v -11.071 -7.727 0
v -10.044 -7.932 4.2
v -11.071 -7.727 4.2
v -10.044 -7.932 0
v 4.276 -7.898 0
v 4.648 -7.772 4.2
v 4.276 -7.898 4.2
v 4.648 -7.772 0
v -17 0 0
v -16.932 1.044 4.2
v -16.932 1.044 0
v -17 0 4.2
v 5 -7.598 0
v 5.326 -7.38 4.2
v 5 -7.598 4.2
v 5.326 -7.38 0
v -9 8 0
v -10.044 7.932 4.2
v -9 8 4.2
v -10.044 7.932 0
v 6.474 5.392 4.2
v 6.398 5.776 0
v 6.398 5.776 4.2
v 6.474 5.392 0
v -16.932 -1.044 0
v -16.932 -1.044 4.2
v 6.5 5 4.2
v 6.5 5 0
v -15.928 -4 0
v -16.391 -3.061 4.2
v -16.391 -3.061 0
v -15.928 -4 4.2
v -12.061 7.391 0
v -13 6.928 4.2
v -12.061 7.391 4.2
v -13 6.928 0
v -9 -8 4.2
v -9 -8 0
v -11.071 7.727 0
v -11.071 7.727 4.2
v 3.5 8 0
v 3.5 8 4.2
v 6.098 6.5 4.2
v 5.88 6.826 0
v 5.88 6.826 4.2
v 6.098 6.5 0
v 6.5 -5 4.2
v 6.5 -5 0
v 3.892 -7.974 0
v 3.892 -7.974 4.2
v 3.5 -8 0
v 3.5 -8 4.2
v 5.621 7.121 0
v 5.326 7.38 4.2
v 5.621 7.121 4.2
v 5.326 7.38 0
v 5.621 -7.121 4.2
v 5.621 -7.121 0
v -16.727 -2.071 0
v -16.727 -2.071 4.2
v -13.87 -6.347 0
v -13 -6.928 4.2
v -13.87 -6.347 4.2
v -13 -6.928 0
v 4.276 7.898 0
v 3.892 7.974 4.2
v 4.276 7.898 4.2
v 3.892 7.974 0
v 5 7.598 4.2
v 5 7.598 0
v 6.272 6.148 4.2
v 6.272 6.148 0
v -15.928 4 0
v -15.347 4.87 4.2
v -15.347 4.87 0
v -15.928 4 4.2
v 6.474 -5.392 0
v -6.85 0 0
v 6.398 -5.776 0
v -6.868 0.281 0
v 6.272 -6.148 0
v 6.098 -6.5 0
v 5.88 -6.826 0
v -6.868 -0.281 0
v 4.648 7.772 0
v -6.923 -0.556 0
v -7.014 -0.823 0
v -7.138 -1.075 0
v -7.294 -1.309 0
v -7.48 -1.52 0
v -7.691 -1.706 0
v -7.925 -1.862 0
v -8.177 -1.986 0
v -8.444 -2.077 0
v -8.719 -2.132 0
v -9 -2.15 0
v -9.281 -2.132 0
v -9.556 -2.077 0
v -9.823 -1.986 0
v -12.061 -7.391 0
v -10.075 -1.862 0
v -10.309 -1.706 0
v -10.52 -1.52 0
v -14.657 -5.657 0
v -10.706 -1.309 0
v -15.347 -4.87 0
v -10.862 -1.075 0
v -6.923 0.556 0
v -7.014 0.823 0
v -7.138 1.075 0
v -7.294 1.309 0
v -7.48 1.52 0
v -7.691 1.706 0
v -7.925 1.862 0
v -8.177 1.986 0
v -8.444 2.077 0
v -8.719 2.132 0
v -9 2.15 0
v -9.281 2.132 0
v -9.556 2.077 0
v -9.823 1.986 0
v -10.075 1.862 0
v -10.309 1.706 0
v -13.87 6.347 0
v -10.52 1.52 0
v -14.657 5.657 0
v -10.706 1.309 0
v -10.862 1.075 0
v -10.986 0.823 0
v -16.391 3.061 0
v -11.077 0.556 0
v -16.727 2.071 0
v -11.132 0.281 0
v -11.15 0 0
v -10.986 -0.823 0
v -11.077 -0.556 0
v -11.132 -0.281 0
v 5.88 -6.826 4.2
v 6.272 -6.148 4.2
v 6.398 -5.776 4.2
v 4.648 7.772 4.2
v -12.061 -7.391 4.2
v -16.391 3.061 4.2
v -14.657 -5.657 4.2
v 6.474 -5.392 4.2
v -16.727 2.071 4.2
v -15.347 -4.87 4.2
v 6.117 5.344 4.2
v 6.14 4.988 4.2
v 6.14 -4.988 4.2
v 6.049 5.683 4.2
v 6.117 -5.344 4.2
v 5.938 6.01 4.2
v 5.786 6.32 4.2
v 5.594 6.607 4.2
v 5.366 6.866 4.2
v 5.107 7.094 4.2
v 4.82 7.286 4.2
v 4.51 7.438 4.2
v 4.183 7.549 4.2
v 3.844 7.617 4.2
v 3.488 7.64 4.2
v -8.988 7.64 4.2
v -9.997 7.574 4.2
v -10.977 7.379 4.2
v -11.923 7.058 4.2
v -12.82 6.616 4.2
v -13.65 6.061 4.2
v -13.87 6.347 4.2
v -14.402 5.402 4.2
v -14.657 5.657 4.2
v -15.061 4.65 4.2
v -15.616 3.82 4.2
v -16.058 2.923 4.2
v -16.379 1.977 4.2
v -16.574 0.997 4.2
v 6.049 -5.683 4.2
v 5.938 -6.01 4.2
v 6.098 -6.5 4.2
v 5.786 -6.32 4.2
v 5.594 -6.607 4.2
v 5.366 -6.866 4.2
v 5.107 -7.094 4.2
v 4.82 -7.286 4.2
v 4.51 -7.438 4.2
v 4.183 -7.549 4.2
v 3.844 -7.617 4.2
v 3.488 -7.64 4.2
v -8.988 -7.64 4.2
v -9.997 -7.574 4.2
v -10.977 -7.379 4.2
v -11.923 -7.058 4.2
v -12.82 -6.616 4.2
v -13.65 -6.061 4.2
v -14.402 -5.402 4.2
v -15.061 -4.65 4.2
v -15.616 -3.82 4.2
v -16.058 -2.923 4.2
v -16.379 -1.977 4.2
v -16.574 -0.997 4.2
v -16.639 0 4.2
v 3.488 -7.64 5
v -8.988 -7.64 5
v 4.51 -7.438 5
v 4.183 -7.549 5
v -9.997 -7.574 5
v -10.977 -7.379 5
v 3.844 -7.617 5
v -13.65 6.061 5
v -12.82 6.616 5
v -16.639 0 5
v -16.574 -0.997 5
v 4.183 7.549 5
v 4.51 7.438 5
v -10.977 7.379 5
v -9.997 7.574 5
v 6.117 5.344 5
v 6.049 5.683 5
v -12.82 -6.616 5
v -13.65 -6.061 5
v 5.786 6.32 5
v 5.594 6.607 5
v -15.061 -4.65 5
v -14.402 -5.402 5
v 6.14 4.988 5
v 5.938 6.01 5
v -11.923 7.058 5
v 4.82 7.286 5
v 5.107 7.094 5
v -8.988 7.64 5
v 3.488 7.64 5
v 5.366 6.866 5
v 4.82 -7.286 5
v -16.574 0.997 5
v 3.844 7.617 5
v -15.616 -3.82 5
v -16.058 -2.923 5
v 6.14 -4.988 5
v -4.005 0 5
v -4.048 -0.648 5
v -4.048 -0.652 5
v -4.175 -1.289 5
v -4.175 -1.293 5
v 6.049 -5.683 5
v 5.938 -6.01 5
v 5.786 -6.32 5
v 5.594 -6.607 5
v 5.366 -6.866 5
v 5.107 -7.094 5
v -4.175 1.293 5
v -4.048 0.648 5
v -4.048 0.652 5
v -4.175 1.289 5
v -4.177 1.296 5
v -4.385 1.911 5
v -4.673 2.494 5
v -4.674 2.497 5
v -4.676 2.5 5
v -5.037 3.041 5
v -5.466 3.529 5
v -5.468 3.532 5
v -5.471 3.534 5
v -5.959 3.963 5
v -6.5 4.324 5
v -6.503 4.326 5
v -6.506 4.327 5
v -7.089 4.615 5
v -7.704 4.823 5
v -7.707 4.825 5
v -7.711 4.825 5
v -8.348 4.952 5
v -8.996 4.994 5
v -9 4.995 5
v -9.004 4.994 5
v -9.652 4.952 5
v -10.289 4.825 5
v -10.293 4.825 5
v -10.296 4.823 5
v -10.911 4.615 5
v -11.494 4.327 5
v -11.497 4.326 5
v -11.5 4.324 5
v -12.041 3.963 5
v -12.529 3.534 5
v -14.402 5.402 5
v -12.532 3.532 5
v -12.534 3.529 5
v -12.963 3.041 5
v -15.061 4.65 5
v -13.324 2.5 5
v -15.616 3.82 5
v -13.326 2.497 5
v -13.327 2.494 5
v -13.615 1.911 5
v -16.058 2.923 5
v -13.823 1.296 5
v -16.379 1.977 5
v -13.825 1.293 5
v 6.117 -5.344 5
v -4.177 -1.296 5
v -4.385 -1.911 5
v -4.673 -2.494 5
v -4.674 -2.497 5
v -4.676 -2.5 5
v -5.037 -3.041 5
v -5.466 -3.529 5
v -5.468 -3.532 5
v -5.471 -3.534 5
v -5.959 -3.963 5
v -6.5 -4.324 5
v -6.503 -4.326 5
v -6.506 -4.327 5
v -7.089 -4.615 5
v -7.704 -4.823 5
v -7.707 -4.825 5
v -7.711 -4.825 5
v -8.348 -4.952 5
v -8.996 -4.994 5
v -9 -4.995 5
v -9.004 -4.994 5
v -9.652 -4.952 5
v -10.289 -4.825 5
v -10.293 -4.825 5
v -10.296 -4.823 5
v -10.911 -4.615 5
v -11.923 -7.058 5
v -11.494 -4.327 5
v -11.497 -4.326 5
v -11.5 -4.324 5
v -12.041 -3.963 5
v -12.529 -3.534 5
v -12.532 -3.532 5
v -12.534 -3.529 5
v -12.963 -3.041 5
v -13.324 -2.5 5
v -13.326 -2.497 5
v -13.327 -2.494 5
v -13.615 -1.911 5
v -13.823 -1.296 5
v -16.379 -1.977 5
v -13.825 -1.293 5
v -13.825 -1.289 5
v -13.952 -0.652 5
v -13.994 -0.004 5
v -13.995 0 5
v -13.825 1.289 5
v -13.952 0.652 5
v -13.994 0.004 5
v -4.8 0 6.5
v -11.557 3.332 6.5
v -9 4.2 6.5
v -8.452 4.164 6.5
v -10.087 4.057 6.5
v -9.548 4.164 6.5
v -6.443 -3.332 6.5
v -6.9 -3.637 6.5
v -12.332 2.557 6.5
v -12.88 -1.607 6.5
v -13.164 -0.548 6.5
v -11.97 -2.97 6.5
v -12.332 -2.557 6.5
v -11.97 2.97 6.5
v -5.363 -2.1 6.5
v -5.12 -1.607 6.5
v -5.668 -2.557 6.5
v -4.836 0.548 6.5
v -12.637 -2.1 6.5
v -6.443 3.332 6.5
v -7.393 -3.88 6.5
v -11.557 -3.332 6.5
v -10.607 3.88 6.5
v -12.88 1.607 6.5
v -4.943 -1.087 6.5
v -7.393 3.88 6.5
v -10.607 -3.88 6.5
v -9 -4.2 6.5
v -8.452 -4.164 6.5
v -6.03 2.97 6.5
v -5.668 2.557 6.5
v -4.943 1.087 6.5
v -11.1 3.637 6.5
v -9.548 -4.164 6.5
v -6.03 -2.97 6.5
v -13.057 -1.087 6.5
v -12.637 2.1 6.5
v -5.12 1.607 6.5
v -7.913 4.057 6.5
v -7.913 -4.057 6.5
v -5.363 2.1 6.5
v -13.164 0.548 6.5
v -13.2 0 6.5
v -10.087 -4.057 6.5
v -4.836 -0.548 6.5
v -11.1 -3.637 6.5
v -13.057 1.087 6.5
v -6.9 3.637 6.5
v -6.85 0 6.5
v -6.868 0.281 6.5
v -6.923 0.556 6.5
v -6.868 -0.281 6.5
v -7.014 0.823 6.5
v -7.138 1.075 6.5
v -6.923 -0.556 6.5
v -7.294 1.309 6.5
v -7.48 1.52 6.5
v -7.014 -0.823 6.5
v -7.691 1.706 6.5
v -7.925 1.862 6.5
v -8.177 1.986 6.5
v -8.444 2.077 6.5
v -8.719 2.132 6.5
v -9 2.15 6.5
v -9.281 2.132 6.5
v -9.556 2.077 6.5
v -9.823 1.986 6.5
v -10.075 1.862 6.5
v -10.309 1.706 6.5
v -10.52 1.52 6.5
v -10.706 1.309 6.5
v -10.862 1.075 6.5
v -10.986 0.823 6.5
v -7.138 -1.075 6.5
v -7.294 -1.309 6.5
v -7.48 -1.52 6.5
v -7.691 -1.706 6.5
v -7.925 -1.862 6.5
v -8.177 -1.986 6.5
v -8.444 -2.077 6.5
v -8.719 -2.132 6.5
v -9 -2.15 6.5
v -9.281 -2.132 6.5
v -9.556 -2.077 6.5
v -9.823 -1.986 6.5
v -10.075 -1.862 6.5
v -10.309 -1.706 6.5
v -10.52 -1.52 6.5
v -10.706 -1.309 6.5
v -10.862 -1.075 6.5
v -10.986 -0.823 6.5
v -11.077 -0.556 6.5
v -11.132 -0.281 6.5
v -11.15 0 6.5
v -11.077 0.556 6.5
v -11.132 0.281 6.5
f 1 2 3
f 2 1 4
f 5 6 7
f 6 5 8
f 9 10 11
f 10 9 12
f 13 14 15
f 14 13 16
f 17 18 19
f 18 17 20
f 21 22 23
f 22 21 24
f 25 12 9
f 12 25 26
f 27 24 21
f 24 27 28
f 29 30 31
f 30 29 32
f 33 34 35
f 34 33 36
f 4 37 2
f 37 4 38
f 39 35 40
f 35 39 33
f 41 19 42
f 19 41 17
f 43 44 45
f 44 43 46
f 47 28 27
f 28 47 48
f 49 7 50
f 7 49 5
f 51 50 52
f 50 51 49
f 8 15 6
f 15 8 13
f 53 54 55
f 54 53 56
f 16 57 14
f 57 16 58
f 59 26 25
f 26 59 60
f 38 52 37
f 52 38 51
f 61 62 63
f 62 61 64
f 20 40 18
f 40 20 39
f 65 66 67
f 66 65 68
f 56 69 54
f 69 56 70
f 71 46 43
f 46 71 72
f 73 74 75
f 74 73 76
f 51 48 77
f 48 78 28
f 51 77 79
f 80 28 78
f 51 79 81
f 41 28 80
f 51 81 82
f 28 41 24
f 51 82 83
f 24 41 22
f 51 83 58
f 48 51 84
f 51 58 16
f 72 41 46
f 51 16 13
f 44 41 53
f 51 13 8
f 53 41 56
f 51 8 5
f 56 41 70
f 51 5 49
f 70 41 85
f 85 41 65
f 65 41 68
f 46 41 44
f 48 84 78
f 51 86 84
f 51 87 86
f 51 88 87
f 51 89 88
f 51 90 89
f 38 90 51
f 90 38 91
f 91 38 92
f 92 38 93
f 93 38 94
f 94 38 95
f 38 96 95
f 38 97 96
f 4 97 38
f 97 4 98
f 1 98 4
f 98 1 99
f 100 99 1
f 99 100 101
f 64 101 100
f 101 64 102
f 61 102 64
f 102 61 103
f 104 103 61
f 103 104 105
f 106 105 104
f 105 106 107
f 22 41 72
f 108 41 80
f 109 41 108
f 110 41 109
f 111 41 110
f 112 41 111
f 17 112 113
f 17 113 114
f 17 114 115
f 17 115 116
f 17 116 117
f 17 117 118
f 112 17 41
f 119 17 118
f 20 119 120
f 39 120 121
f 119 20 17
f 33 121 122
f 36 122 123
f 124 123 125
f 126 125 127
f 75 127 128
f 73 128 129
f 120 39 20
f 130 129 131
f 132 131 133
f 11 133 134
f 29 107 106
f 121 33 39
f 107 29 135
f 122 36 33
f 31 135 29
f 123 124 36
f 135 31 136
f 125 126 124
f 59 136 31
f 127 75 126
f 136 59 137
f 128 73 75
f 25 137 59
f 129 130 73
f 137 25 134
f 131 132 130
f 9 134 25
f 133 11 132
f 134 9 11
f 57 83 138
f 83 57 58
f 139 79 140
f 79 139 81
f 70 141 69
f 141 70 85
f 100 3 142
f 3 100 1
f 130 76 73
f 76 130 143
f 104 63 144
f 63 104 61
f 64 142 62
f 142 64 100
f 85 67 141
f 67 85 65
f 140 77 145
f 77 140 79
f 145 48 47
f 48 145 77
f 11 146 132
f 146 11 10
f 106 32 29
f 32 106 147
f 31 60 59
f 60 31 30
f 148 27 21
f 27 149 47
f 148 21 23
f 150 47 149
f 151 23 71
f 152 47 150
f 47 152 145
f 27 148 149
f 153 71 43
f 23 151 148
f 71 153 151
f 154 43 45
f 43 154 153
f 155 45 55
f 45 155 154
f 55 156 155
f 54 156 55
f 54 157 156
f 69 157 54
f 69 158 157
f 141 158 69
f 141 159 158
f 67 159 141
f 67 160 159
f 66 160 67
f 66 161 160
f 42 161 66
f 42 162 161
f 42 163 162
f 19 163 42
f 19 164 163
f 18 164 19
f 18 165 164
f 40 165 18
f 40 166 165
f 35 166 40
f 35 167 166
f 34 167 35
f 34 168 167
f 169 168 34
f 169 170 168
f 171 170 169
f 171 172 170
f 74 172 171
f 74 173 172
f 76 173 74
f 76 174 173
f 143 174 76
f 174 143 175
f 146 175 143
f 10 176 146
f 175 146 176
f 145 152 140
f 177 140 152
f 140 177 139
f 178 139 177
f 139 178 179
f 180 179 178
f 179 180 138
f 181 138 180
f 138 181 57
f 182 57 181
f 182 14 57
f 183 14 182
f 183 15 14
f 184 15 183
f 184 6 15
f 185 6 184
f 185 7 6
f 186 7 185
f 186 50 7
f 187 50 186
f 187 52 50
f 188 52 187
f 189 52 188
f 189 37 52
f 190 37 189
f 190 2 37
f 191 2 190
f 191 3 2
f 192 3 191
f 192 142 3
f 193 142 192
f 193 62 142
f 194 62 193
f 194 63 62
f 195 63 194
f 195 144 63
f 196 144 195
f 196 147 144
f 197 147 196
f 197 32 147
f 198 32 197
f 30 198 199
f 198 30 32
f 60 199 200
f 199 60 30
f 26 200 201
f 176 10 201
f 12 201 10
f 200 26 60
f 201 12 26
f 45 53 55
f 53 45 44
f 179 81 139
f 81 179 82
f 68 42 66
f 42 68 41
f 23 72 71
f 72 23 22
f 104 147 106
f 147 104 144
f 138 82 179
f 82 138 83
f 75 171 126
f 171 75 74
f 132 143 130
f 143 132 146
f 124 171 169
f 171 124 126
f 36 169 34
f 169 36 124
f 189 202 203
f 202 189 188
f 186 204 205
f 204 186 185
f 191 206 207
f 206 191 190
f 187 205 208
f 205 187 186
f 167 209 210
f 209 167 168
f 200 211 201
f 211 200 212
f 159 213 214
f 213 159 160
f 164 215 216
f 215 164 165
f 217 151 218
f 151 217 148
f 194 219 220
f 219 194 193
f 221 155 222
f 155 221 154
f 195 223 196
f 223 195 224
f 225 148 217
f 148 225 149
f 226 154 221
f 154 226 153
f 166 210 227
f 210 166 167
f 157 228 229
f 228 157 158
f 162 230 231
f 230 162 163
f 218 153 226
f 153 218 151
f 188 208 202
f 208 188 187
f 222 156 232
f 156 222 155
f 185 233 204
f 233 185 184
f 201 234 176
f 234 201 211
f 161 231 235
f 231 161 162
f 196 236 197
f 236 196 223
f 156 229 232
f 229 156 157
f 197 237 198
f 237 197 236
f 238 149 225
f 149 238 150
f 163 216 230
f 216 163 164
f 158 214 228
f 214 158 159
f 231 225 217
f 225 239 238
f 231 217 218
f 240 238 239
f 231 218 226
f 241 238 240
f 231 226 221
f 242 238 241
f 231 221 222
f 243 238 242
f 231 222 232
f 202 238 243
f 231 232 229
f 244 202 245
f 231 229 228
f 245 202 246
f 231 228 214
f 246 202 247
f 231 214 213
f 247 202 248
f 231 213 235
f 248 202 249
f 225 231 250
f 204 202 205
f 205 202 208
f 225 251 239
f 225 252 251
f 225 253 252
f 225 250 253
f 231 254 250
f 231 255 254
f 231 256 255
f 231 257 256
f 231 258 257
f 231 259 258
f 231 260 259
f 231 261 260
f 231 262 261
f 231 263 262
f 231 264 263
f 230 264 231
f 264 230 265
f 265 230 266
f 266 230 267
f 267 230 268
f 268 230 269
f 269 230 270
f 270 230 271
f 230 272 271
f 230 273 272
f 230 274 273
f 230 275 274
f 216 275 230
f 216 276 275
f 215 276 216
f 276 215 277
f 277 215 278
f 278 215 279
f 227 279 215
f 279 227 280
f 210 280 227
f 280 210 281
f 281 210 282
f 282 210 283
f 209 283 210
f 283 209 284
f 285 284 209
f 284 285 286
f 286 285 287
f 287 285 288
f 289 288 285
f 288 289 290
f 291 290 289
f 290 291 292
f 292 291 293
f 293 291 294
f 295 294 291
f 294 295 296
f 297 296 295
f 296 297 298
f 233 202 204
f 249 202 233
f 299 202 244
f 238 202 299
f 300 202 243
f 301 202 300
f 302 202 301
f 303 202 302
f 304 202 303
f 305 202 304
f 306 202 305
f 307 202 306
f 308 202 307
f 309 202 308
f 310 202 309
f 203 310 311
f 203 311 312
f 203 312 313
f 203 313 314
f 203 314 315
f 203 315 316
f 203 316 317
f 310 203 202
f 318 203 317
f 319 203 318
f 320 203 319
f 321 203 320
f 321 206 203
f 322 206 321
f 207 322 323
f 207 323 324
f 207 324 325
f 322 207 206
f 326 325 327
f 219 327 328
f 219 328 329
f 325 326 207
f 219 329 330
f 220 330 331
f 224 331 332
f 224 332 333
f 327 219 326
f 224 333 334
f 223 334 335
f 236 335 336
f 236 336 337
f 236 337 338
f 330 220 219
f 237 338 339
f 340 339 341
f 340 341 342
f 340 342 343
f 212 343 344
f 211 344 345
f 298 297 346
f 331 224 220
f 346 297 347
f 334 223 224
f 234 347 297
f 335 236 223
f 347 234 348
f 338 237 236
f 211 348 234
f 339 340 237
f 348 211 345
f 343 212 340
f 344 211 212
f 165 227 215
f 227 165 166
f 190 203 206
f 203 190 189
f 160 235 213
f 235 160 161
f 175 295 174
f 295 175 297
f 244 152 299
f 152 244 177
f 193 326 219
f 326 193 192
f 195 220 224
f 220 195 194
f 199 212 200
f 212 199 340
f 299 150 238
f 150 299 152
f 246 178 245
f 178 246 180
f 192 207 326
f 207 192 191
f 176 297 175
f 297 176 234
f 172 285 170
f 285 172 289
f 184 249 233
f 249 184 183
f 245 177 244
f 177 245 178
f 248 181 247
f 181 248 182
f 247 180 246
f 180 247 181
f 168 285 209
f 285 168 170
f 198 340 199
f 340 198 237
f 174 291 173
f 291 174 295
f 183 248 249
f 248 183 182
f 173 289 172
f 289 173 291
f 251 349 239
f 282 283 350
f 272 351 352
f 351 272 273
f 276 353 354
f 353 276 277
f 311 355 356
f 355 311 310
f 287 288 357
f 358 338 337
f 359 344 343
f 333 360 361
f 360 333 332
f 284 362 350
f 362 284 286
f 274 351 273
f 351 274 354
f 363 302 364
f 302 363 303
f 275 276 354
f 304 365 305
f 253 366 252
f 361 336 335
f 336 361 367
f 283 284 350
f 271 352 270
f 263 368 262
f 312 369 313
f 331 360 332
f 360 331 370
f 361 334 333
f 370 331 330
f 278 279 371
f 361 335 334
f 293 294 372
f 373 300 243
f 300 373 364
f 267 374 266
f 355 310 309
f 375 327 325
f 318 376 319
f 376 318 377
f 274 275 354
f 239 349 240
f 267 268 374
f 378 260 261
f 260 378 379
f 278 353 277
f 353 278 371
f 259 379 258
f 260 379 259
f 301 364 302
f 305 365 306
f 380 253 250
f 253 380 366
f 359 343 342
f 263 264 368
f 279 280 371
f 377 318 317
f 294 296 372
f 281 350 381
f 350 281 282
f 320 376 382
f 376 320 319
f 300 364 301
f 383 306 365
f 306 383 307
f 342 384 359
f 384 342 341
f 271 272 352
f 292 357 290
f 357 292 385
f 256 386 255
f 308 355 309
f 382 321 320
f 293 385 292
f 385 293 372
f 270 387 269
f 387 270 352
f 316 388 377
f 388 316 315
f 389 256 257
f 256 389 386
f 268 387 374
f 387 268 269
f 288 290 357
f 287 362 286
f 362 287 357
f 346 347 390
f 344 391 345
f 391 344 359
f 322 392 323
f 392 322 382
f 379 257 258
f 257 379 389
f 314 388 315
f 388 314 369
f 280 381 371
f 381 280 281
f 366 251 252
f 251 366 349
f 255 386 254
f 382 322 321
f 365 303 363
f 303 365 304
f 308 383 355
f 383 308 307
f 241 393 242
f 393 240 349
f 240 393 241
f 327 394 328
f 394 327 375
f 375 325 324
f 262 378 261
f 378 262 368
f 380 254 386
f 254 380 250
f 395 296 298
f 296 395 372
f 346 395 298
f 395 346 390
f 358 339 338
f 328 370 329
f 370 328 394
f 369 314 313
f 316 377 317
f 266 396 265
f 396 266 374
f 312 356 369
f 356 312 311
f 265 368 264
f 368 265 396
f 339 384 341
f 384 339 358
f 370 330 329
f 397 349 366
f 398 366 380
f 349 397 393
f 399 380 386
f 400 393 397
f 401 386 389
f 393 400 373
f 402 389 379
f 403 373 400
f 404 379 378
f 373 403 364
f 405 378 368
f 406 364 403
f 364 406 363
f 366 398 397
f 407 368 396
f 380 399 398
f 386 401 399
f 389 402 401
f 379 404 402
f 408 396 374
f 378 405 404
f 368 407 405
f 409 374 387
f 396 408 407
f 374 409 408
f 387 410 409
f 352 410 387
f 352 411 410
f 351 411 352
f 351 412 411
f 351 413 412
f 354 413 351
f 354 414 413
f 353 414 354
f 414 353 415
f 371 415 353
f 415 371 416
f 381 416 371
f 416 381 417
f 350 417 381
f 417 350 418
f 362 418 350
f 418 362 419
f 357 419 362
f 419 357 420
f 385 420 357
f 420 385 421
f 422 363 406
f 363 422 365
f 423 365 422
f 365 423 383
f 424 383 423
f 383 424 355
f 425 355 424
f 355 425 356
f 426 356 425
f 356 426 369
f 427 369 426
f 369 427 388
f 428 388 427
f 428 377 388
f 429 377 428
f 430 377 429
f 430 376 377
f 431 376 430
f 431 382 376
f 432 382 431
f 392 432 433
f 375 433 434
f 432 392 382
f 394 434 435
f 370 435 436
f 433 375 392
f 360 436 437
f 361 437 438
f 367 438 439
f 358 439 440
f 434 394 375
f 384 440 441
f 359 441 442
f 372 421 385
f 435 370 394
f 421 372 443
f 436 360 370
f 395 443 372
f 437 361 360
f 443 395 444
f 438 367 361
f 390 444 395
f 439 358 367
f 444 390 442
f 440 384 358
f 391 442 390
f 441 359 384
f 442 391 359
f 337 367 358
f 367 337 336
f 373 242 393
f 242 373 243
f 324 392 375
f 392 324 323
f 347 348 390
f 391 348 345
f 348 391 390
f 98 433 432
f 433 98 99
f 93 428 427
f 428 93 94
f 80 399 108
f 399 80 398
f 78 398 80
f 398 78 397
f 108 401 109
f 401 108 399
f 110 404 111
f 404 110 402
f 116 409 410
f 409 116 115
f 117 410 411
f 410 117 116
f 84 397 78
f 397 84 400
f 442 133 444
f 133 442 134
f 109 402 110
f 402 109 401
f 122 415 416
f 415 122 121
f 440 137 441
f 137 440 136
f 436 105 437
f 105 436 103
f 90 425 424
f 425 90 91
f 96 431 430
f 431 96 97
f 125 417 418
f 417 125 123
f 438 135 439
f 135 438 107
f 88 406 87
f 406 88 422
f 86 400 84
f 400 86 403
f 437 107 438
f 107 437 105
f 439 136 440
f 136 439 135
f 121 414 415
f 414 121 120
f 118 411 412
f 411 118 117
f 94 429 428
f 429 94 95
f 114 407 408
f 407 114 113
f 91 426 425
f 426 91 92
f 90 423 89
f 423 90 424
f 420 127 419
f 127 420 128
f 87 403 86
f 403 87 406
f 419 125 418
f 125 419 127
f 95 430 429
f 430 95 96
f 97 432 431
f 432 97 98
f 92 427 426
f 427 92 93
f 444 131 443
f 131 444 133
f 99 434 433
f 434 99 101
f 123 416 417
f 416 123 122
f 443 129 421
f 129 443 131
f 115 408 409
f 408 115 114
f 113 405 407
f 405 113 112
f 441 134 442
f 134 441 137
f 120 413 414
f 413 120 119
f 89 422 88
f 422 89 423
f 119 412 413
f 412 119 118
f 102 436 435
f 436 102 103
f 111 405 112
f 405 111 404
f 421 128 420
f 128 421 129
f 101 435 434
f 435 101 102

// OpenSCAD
// Simple integrated external mounting ear pattern.
// Use as a starting point, then adapt coordinate mapping to the enclosure.

$fn = 48;

mount_ear_length = 18;
mount_ear_width = 16;
mount_ear_thickness = 5;
mount_hole_diameter = 4.3;
mount_boss_outer_diameter = 10;
mount_boss_height = 1.5;
mount_boss_chamfer = 0.8;
mount_neck_width = 16;
mount_neck_blend_radius = 3;
mount_gusset_thickness = 3;
mount_gusset_height = 7;
mount_gusset_length = 10;
mount_edge_chamfer = 0.8;

module mount_ear_body_footprint_2d(hole_x, root_x, y = 0, shrink = 0) {
    root_r = min(mount_neck_blend_radius, mount_neck_width / 2 - 0.1);
    lug_r = mount_ear_width / 2;

    offset(delta = -shrink)
        hull() {
            translate([hole_x, y])
                circle(r = lug_r);
            translate([root_x, y - mount_neck_width / 2 + root_r])
                circle(r = root_r);
            translate([root_x, y + mount_neck_width / 2 - root_r])
                circle(r = root_r);
        }
}

module simple_mount_ear(hole_x = -9, root_x = 3.5, y = 0) {
    difference() {
        union() {
            linear_extrude(height = mount_ear_thickness - mount_edge_chamfer)
                mount_ear_body_footprint_2d(hole_x, root_x, y, 0);

            translate([0, 0, mount_ear_thickness - mount_edge_chamfer - 0.01])
                linear_extrude(height = mount_edge_chamfer + 0.01)
                    mount_ear_body_footprint_2d(
                        hole_x,
                        root_x,
                        y,
                        mount_edge_chamfer * 0.45
                    );

            translate([hole_x, y, mount_ear_thickness - 0.01])
                cylinder(
                    h = mount_boss_height + 0.01,
                    d1 = mount_boss_outer_diameter,
                    d2 = mount_boss_outer_diameter - 2 * mount_boss_chamfer
                );
        }

        translate([hole_x, y, -0.5])
            cylinder(
                h = mount_ear_thickness + mount_boss_height + 1,
                d = mount_hole_diameter
            );
    }
}

simple_mount_ear();
